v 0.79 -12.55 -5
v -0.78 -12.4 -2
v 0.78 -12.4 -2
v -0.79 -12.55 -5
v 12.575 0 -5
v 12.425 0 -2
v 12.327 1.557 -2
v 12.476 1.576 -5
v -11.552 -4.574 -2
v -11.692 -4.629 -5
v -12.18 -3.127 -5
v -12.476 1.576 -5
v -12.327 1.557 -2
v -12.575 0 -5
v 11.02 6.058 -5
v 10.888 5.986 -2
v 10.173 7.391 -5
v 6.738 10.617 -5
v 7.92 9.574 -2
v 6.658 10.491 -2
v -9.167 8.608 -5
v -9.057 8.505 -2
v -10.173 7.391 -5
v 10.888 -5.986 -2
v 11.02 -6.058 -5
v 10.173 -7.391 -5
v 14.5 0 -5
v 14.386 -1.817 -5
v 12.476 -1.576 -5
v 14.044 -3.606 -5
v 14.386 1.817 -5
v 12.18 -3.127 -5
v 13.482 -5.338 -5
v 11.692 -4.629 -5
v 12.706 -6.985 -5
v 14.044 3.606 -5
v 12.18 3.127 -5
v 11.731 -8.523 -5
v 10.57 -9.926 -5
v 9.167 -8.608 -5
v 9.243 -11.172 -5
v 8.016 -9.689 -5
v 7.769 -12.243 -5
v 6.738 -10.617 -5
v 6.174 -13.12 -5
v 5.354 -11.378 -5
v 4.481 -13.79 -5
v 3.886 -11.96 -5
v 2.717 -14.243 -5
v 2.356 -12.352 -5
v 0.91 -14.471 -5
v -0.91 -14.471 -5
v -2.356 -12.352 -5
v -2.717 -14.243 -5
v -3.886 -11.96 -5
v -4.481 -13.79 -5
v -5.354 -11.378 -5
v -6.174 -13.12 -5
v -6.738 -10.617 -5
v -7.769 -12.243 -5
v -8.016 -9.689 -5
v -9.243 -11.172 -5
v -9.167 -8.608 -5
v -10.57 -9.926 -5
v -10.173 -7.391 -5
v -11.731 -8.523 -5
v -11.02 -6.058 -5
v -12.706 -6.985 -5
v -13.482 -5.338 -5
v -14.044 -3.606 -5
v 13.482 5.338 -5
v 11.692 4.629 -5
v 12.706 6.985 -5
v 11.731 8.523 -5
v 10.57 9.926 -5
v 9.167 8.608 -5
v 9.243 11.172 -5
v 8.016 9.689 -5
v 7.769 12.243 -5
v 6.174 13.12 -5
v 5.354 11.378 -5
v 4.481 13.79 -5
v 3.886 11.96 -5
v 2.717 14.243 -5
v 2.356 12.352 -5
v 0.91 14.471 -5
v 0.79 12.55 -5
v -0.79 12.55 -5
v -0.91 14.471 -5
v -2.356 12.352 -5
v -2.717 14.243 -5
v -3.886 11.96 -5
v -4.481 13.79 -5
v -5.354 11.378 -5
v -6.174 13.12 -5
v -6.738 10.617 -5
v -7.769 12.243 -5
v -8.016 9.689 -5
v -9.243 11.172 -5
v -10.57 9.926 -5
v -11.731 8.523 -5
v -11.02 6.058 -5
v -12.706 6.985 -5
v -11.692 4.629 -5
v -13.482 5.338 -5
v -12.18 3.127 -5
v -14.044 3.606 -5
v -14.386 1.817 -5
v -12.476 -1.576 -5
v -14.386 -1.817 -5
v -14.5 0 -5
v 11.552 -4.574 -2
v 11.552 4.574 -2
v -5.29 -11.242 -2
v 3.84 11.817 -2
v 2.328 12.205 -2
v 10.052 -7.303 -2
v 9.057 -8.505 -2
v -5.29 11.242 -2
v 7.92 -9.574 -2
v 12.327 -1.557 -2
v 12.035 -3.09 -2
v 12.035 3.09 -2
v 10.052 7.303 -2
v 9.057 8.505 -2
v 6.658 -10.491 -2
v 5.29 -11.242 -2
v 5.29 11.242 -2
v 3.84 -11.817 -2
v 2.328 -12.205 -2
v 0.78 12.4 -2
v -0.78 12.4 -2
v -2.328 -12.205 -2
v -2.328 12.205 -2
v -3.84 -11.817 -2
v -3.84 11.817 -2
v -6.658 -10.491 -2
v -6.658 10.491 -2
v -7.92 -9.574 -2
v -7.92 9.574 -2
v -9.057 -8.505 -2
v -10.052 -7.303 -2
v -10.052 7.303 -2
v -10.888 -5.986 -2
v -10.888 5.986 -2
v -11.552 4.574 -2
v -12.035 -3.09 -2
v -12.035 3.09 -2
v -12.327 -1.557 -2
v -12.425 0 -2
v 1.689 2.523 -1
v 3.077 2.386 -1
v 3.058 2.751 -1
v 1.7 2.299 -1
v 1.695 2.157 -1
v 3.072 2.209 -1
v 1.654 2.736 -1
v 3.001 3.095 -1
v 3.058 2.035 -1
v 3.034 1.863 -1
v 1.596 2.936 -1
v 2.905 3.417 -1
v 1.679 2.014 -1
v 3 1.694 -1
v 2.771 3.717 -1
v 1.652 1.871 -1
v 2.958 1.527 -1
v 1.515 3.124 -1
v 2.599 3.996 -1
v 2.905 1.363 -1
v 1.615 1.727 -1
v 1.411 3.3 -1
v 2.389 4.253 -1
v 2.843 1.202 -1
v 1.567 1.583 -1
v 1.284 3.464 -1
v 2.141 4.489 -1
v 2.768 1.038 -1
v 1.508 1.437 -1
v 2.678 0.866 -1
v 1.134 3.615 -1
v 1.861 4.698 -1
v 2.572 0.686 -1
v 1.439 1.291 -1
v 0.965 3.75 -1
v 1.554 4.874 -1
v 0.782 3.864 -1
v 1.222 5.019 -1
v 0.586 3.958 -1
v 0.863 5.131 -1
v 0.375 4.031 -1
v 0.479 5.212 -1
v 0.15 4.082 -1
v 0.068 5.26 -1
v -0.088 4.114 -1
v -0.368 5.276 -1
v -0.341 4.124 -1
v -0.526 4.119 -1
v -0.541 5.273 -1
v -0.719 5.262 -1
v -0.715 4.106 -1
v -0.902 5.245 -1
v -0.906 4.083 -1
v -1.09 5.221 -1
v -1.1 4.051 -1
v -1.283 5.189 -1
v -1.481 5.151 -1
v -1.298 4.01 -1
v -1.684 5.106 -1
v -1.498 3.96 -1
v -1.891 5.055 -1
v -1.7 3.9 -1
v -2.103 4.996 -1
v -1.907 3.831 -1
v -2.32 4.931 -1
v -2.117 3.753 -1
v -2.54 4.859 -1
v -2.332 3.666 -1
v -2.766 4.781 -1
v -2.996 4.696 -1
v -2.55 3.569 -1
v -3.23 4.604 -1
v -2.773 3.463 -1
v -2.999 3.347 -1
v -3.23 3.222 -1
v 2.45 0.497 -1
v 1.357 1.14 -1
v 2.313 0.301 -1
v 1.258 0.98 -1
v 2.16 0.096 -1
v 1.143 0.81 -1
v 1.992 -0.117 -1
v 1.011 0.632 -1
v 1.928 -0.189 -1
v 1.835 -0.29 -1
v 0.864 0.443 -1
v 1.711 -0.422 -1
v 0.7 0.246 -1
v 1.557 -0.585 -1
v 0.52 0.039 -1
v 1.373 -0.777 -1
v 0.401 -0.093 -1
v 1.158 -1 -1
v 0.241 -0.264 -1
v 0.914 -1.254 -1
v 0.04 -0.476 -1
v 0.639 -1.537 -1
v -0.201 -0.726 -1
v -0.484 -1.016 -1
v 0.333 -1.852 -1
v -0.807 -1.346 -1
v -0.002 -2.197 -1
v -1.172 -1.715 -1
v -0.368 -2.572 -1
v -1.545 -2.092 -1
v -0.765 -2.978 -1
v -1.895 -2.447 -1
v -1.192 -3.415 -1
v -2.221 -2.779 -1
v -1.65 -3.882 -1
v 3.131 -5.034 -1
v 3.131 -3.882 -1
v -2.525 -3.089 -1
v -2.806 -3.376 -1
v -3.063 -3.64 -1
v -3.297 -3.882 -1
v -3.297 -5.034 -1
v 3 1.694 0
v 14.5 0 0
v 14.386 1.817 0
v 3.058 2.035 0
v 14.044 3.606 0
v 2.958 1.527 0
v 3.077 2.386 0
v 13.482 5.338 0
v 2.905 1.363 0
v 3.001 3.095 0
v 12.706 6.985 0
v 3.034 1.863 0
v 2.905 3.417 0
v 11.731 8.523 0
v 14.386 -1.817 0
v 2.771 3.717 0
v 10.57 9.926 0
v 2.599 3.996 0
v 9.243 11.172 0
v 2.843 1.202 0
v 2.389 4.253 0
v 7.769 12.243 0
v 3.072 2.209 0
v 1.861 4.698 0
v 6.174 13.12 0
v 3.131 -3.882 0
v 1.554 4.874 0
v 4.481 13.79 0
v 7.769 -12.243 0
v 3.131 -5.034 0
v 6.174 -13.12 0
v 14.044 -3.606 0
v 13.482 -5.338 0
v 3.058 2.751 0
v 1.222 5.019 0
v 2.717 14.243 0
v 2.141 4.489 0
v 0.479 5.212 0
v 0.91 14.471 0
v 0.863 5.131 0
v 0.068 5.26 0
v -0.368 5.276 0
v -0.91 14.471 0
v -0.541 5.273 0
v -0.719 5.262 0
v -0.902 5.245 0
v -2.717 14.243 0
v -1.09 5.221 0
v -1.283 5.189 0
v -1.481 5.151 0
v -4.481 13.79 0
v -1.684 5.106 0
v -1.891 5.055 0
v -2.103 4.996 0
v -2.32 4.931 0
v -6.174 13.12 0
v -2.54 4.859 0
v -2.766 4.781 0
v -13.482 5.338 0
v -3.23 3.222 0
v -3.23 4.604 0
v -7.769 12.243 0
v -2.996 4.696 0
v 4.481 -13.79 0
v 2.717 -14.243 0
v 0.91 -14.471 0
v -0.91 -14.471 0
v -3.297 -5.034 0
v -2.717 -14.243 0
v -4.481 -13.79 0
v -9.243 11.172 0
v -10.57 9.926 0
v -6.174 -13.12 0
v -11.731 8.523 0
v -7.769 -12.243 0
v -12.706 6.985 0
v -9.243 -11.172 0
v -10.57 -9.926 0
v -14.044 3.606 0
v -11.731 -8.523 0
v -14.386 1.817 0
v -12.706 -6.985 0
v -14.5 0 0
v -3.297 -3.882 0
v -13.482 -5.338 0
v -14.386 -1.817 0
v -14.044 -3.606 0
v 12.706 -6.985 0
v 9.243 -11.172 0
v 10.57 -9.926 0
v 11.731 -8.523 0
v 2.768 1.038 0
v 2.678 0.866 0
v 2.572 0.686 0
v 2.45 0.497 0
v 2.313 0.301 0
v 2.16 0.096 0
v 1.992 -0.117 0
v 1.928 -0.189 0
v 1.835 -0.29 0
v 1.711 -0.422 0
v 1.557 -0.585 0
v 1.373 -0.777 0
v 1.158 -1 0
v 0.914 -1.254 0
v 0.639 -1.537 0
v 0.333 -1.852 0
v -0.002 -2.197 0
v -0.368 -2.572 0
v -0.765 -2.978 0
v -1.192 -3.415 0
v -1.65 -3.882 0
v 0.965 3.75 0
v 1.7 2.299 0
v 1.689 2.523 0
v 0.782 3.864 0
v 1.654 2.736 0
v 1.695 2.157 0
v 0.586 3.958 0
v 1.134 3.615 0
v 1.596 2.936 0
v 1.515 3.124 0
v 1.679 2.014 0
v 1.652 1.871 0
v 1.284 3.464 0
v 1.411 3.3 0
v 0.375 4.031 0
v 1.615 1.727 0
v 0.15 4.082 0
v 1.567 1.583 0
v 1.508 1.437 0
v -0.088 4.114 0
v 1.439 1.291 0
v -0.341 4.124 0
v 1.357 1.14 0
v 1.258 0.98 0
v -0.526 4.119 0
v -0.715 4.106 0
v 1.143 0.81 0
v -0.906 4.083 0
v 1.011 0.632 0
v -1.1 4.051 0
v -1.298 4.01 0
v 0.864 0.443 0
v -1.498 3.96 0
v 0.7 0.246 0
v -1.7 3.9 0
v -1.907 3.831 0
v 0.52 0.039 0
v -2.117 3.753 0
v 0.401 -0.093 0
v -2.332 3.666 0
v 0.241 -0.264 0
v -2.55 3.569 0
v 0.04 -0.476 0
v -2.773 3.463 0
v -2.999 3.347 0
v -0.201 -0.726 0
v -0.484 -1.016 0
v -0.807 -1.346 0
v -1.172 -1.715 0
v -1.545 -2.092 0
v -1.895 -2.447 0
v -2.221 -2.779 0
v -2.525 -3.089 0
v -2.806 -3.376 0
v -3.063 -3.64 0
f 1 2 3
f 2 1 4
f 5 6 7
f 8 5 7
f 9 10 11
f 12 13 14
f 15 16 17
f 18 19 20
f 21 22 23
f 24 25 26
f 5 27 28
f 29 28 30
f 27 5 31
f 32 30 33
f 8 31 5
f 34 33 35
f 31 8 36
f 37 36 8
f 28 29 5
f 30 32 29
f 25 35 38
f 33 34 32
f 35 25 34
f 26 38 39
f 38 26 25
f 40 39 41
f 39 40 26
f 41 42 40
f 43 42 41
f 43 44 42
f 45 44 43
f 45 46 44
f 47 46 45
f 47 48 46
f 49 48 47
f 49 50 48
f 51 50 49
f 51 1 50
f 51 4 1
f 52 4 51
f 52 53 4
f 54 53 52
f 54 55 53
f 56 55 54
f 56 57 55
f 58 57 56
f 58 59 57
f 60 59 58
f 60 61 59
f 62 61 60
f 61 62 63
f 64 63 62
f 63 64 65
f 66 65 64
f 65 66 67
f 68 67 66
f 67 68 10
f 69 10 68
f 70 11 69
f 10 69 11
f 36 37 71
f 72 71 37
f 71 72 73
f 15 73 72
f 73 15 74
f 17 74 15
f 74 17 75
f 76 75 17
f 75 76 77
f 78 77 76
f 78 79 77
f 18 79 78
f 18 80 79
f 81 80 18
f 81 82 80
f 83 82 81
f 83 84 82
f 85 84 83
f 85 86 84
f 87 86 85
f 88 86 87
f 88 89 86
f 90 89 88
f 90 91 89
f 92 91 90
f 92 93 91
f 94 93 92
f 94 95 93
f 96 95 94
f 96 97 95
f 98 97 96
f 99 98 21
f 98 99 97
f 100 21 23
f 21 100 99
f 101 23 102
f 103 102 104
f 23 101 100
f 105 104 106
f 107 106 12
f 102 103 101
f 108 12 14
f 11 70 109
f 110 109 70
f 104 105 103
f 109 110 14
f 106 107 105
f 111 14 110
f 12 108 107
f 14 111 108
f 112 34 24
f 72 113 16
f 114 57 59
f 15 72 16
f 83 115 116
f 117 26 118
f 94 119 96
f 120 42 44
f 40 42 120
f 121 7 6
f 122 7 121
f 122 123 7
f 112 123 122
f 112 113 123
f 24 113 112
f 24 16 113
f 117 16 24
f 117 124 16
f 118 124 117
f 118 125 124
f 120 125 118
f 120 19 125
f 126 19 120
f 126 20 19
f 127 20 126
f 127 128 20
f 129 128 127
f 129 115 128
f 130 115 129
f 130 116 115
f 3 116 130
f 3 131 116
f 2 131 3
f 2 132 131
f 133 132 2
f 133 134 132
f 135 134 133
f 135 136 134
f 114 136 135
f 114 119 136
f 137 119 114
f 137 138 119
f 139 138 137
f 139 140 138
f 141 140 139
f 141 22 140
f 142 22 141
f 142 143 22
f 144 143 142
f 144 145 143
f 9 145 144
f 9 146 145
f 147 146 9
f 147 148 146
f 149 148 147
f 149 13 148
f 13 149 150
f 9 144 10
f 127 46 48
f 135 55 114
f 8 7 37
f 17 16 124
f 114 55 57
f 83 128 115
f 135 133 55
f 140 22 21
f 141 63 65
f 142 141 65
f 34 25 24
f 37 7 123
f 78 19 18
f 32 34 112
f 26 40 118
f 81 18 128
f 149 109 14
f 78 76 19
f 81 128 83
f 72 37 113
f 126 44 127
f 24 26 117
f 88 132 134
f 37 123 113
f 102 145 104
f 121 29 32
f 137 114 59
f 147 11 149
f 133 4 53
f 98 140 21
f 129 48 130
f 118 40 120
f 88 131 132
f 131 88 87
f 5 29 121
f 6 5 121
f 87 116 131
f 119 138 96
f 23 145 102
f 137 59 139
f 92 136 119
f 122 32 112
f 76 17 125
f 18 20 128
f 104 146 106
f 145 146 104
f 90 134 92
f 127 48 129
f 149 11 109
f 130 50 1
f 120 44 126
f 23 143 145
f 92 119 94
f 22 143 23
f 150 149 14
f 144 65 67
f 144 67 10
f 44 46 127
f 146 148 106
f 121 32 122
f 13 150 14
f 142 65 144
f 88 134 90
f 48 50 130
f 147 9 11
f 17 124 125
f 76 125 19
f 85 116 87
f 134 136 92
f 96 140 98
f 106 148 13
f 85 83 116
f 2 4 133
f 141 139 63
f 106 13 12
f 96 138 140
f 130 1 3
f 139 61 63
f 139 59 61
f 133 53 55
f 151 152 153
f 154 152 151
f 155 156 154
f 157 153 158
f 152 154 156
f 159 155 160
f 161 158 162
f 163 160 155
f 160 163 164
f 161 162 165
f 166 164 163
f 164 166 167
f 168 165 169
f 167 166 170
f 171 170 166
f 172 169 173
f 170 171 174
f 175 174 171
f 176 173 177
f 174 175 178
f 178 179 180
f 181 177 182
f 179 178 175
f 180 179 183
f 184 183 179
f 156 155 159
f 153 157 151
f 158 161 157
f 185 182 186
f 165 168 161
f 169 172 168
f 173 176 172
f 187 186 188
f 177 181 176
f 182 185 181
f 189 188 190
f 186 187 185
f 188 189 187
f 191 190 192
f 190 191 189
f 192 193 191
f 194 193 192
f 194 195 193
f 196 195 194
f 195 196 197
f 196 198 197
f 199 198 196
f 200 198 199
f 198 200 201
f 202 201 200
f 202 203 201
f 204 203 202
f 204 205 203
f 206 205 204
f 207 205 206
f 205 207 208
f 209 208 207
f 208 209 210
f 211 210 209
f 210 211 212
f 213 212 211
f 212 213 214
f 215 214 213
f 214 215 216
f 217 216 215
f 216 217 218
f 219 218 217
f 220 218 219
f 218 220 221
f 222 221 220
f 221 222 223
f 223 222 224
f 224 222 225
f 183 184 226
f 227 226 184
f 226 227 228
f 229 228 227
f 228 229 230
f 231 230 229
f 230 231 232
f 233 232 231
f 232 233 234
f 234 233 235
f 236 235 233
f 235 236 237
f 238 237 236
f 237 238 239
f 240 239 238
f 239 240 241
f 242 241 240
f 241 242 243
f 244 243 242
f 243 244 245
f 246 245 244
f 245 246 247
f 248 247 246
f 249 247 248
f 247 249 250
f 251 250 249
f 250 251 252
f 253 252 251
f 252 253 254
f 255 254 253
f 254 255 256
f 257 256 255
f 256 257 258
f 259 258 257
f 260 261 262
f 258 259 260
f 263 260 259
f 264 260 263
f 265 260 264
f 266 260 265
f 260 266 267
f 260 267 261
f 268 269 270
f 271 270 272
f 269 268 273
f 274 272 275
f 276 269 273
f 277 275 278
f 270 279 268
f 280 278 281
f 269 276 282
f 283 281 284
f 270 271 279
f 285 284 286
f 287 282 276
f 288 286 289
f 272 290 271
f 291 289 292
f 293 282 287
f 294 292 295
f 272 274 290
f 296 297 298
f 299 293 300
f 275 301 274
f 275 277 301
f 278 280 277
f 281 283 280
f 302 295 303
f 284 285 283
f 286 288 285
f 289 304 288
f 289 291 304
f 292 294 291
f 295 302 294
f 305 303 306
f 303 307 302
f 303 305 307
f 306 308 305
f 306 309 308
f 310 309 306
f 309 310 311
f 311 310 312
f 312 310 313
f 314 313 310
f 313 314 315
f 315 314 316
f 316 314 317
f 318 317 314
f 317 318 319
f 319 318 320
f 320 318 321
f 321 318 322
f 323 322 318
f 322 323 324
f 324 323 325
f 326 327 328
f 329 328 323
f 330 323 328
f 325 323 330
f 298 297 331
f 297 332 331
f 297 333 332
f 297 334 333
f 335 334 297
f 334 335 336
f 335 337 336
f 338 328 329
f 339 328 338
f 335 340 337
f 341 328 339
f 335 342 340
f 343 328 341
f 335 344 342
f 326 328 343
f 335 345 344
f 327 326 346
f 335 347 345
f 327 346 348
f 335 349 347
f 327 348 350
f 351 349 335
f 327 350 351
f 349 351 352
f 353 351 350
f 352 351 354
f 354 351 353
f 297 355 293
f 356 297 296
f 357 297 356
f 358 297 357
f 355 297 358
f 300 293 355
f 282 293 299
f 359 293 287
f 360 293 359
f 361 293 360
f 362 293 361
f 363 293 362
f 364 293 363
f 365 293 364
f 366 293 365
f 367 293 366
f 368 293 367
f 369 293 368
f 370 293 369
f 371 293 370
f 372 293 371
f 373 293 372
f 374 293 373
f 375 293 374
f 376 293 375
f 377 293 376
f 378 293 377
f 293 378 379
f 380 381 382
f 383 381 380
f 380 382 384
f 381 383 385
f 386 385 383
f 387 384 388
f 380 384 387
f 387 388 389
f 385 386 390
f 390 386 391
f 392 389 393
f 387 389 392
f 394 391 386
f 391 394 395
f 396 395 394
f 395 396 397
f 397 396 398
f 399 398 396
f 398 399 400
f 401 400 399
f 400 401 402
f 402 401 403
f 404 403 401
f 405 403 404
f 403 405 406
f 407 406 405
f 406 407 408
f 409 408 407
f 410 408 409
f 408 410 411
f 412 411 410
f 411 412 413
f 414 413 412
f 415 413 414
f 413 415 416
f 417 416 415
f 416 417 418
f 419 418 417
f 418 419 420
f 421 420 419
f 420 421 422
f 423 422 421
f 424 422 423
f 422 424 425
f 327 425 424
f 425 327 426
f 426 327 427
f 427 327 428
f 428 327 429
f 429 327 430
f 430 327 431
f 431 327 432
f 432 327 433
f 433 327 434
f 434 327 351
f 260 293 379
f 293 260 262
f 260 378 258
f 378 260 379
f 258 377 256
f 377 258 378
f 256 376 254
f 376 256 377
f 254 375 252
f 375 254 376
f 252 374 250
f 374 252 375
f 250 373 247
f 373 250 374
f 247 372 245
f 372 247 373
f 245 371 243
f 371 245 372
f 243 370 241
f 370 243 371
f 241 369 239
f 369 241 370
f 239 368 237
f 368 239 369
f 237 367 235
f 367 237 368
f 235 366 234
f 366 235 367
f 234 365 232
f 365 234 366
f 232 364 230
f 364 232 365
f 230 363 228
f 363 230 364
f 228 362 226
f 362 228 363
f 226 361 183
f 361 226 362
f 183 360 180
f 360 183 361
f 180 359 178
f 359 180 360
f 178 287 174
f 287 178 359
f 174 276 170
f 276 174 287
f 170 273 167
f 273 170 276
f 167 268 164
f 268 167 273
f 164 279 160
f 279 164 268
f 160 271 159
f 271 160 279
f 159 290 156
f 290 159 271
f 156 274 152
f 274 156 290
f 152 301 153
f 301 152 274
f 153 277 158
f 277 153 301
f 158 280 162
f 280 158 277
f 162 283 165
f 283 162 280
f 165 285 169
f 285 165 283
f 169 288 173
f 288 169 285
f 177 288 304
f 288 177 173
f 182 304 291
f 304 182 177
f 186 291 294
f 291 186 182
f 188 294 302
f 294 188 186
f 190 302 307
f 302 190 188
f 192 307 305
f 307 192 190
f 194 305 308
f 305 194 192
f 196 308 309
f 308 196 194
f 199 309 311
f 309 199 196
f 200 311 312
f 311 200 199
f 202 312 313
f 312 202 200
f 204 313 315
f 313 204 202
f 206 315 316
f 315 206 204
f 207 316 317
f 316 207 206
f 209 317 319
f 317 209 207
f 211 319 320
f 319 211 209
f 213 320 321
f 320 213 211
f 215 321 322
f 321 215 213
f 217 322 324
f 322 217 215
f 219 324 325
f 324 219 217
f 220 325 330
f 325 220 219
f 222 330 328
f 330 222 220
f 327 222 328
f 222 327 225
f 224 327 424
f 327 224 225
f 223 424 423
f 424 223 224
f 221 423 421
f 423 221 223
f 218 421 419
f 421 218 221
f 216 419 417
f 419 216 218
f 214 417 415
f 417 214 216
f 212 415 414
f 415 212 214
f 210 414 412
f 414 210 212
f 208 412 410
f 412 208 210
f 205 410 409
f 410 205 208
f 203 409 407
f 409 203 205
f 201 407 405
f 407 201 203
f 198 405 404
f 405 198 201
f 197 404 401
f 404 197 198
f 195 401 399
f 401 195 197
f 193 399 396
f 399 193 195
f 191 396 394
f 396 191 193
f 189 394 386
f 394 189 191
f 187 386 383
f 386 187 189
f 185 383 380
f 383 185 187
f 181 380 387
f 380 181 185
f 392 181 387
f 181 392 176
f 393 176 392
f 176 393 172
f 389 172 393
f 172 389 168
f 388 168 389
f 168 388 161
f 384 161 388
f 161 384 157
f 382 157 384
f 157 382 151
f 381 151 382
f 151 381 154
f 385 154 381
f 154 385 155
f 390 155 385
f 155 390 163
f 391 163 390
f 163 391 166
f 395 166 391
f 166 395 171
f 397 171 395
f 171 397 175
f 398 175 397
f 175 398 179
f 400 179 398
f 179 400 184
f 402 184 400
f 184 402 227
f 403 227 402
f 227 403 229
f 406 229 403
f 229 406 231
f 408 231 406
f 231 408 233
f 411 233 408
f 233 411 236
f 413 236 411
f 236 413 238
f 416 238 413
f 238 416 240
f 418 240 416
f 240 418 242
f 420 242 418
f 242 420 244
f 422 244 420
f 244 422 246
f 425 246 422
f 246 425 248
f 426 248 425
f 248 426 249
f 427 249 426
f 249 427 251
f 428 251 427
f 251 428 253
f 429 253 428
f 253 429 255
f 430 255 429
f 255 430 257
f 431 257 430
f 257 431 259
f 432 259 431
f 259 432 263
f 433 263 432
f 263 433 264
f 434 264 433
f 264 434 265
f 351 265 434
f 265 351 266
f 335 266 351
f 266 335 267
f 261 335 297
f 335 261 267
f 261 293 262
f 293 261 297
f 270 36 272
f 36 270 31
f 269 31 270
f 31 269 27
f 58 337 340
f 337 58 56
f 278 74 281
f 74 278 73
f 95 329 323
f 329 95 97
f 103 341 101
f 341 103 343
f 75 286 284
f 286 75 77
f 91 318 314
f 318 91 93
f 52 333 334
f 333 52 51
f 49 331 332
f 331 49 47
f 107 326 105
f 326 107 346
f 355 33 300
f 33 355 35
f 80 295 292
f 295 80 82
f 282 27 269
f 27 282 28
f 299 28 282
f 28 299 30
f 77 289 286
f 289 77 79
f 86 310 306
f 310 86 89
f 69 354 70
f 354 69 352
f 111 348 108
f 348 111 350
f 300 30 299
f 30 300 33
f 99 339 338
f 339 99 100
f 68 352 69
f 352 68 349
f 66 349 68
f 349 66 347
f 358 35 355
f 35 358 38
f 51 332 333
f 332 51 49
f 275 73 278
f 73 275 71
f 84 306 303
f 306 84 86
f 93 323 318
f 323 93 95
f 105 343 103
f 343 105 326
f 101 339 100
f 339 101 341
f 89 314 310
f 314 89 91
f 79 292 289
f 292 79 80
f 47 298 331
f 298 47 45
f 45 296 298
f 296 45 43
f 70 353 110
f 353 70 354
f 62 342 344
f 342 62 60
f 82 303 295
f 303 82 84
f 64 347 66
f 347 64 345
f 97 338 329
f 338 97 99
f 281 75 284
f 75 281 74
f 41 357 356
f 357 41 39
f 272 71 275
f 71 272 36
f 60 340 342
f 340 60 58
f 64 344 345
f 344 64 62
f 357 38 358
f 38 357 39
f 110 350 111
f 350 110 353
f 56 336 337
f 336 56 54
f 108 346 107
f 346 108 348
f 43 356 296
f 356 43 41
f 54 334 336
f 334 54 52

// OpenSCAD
$fn = 50;

difference() {
	union() {
		translate(v = [0, 0, -5.0]) {
			cylinder(h = 5, r = 14.5);
		}
	}
	union() {
		#translate(v = [0, 0, -5.0]) {
			cylinder(h = 3, r1 = 12.575, r2 = 12.425);
		}
		translate(v = [0, 0, -1]) {
			linear_extrude(height = 1) {
				text(font = "Impact", halign = "center", size = 10, text = "2", valign = "center");
			}
		}
	}
}
